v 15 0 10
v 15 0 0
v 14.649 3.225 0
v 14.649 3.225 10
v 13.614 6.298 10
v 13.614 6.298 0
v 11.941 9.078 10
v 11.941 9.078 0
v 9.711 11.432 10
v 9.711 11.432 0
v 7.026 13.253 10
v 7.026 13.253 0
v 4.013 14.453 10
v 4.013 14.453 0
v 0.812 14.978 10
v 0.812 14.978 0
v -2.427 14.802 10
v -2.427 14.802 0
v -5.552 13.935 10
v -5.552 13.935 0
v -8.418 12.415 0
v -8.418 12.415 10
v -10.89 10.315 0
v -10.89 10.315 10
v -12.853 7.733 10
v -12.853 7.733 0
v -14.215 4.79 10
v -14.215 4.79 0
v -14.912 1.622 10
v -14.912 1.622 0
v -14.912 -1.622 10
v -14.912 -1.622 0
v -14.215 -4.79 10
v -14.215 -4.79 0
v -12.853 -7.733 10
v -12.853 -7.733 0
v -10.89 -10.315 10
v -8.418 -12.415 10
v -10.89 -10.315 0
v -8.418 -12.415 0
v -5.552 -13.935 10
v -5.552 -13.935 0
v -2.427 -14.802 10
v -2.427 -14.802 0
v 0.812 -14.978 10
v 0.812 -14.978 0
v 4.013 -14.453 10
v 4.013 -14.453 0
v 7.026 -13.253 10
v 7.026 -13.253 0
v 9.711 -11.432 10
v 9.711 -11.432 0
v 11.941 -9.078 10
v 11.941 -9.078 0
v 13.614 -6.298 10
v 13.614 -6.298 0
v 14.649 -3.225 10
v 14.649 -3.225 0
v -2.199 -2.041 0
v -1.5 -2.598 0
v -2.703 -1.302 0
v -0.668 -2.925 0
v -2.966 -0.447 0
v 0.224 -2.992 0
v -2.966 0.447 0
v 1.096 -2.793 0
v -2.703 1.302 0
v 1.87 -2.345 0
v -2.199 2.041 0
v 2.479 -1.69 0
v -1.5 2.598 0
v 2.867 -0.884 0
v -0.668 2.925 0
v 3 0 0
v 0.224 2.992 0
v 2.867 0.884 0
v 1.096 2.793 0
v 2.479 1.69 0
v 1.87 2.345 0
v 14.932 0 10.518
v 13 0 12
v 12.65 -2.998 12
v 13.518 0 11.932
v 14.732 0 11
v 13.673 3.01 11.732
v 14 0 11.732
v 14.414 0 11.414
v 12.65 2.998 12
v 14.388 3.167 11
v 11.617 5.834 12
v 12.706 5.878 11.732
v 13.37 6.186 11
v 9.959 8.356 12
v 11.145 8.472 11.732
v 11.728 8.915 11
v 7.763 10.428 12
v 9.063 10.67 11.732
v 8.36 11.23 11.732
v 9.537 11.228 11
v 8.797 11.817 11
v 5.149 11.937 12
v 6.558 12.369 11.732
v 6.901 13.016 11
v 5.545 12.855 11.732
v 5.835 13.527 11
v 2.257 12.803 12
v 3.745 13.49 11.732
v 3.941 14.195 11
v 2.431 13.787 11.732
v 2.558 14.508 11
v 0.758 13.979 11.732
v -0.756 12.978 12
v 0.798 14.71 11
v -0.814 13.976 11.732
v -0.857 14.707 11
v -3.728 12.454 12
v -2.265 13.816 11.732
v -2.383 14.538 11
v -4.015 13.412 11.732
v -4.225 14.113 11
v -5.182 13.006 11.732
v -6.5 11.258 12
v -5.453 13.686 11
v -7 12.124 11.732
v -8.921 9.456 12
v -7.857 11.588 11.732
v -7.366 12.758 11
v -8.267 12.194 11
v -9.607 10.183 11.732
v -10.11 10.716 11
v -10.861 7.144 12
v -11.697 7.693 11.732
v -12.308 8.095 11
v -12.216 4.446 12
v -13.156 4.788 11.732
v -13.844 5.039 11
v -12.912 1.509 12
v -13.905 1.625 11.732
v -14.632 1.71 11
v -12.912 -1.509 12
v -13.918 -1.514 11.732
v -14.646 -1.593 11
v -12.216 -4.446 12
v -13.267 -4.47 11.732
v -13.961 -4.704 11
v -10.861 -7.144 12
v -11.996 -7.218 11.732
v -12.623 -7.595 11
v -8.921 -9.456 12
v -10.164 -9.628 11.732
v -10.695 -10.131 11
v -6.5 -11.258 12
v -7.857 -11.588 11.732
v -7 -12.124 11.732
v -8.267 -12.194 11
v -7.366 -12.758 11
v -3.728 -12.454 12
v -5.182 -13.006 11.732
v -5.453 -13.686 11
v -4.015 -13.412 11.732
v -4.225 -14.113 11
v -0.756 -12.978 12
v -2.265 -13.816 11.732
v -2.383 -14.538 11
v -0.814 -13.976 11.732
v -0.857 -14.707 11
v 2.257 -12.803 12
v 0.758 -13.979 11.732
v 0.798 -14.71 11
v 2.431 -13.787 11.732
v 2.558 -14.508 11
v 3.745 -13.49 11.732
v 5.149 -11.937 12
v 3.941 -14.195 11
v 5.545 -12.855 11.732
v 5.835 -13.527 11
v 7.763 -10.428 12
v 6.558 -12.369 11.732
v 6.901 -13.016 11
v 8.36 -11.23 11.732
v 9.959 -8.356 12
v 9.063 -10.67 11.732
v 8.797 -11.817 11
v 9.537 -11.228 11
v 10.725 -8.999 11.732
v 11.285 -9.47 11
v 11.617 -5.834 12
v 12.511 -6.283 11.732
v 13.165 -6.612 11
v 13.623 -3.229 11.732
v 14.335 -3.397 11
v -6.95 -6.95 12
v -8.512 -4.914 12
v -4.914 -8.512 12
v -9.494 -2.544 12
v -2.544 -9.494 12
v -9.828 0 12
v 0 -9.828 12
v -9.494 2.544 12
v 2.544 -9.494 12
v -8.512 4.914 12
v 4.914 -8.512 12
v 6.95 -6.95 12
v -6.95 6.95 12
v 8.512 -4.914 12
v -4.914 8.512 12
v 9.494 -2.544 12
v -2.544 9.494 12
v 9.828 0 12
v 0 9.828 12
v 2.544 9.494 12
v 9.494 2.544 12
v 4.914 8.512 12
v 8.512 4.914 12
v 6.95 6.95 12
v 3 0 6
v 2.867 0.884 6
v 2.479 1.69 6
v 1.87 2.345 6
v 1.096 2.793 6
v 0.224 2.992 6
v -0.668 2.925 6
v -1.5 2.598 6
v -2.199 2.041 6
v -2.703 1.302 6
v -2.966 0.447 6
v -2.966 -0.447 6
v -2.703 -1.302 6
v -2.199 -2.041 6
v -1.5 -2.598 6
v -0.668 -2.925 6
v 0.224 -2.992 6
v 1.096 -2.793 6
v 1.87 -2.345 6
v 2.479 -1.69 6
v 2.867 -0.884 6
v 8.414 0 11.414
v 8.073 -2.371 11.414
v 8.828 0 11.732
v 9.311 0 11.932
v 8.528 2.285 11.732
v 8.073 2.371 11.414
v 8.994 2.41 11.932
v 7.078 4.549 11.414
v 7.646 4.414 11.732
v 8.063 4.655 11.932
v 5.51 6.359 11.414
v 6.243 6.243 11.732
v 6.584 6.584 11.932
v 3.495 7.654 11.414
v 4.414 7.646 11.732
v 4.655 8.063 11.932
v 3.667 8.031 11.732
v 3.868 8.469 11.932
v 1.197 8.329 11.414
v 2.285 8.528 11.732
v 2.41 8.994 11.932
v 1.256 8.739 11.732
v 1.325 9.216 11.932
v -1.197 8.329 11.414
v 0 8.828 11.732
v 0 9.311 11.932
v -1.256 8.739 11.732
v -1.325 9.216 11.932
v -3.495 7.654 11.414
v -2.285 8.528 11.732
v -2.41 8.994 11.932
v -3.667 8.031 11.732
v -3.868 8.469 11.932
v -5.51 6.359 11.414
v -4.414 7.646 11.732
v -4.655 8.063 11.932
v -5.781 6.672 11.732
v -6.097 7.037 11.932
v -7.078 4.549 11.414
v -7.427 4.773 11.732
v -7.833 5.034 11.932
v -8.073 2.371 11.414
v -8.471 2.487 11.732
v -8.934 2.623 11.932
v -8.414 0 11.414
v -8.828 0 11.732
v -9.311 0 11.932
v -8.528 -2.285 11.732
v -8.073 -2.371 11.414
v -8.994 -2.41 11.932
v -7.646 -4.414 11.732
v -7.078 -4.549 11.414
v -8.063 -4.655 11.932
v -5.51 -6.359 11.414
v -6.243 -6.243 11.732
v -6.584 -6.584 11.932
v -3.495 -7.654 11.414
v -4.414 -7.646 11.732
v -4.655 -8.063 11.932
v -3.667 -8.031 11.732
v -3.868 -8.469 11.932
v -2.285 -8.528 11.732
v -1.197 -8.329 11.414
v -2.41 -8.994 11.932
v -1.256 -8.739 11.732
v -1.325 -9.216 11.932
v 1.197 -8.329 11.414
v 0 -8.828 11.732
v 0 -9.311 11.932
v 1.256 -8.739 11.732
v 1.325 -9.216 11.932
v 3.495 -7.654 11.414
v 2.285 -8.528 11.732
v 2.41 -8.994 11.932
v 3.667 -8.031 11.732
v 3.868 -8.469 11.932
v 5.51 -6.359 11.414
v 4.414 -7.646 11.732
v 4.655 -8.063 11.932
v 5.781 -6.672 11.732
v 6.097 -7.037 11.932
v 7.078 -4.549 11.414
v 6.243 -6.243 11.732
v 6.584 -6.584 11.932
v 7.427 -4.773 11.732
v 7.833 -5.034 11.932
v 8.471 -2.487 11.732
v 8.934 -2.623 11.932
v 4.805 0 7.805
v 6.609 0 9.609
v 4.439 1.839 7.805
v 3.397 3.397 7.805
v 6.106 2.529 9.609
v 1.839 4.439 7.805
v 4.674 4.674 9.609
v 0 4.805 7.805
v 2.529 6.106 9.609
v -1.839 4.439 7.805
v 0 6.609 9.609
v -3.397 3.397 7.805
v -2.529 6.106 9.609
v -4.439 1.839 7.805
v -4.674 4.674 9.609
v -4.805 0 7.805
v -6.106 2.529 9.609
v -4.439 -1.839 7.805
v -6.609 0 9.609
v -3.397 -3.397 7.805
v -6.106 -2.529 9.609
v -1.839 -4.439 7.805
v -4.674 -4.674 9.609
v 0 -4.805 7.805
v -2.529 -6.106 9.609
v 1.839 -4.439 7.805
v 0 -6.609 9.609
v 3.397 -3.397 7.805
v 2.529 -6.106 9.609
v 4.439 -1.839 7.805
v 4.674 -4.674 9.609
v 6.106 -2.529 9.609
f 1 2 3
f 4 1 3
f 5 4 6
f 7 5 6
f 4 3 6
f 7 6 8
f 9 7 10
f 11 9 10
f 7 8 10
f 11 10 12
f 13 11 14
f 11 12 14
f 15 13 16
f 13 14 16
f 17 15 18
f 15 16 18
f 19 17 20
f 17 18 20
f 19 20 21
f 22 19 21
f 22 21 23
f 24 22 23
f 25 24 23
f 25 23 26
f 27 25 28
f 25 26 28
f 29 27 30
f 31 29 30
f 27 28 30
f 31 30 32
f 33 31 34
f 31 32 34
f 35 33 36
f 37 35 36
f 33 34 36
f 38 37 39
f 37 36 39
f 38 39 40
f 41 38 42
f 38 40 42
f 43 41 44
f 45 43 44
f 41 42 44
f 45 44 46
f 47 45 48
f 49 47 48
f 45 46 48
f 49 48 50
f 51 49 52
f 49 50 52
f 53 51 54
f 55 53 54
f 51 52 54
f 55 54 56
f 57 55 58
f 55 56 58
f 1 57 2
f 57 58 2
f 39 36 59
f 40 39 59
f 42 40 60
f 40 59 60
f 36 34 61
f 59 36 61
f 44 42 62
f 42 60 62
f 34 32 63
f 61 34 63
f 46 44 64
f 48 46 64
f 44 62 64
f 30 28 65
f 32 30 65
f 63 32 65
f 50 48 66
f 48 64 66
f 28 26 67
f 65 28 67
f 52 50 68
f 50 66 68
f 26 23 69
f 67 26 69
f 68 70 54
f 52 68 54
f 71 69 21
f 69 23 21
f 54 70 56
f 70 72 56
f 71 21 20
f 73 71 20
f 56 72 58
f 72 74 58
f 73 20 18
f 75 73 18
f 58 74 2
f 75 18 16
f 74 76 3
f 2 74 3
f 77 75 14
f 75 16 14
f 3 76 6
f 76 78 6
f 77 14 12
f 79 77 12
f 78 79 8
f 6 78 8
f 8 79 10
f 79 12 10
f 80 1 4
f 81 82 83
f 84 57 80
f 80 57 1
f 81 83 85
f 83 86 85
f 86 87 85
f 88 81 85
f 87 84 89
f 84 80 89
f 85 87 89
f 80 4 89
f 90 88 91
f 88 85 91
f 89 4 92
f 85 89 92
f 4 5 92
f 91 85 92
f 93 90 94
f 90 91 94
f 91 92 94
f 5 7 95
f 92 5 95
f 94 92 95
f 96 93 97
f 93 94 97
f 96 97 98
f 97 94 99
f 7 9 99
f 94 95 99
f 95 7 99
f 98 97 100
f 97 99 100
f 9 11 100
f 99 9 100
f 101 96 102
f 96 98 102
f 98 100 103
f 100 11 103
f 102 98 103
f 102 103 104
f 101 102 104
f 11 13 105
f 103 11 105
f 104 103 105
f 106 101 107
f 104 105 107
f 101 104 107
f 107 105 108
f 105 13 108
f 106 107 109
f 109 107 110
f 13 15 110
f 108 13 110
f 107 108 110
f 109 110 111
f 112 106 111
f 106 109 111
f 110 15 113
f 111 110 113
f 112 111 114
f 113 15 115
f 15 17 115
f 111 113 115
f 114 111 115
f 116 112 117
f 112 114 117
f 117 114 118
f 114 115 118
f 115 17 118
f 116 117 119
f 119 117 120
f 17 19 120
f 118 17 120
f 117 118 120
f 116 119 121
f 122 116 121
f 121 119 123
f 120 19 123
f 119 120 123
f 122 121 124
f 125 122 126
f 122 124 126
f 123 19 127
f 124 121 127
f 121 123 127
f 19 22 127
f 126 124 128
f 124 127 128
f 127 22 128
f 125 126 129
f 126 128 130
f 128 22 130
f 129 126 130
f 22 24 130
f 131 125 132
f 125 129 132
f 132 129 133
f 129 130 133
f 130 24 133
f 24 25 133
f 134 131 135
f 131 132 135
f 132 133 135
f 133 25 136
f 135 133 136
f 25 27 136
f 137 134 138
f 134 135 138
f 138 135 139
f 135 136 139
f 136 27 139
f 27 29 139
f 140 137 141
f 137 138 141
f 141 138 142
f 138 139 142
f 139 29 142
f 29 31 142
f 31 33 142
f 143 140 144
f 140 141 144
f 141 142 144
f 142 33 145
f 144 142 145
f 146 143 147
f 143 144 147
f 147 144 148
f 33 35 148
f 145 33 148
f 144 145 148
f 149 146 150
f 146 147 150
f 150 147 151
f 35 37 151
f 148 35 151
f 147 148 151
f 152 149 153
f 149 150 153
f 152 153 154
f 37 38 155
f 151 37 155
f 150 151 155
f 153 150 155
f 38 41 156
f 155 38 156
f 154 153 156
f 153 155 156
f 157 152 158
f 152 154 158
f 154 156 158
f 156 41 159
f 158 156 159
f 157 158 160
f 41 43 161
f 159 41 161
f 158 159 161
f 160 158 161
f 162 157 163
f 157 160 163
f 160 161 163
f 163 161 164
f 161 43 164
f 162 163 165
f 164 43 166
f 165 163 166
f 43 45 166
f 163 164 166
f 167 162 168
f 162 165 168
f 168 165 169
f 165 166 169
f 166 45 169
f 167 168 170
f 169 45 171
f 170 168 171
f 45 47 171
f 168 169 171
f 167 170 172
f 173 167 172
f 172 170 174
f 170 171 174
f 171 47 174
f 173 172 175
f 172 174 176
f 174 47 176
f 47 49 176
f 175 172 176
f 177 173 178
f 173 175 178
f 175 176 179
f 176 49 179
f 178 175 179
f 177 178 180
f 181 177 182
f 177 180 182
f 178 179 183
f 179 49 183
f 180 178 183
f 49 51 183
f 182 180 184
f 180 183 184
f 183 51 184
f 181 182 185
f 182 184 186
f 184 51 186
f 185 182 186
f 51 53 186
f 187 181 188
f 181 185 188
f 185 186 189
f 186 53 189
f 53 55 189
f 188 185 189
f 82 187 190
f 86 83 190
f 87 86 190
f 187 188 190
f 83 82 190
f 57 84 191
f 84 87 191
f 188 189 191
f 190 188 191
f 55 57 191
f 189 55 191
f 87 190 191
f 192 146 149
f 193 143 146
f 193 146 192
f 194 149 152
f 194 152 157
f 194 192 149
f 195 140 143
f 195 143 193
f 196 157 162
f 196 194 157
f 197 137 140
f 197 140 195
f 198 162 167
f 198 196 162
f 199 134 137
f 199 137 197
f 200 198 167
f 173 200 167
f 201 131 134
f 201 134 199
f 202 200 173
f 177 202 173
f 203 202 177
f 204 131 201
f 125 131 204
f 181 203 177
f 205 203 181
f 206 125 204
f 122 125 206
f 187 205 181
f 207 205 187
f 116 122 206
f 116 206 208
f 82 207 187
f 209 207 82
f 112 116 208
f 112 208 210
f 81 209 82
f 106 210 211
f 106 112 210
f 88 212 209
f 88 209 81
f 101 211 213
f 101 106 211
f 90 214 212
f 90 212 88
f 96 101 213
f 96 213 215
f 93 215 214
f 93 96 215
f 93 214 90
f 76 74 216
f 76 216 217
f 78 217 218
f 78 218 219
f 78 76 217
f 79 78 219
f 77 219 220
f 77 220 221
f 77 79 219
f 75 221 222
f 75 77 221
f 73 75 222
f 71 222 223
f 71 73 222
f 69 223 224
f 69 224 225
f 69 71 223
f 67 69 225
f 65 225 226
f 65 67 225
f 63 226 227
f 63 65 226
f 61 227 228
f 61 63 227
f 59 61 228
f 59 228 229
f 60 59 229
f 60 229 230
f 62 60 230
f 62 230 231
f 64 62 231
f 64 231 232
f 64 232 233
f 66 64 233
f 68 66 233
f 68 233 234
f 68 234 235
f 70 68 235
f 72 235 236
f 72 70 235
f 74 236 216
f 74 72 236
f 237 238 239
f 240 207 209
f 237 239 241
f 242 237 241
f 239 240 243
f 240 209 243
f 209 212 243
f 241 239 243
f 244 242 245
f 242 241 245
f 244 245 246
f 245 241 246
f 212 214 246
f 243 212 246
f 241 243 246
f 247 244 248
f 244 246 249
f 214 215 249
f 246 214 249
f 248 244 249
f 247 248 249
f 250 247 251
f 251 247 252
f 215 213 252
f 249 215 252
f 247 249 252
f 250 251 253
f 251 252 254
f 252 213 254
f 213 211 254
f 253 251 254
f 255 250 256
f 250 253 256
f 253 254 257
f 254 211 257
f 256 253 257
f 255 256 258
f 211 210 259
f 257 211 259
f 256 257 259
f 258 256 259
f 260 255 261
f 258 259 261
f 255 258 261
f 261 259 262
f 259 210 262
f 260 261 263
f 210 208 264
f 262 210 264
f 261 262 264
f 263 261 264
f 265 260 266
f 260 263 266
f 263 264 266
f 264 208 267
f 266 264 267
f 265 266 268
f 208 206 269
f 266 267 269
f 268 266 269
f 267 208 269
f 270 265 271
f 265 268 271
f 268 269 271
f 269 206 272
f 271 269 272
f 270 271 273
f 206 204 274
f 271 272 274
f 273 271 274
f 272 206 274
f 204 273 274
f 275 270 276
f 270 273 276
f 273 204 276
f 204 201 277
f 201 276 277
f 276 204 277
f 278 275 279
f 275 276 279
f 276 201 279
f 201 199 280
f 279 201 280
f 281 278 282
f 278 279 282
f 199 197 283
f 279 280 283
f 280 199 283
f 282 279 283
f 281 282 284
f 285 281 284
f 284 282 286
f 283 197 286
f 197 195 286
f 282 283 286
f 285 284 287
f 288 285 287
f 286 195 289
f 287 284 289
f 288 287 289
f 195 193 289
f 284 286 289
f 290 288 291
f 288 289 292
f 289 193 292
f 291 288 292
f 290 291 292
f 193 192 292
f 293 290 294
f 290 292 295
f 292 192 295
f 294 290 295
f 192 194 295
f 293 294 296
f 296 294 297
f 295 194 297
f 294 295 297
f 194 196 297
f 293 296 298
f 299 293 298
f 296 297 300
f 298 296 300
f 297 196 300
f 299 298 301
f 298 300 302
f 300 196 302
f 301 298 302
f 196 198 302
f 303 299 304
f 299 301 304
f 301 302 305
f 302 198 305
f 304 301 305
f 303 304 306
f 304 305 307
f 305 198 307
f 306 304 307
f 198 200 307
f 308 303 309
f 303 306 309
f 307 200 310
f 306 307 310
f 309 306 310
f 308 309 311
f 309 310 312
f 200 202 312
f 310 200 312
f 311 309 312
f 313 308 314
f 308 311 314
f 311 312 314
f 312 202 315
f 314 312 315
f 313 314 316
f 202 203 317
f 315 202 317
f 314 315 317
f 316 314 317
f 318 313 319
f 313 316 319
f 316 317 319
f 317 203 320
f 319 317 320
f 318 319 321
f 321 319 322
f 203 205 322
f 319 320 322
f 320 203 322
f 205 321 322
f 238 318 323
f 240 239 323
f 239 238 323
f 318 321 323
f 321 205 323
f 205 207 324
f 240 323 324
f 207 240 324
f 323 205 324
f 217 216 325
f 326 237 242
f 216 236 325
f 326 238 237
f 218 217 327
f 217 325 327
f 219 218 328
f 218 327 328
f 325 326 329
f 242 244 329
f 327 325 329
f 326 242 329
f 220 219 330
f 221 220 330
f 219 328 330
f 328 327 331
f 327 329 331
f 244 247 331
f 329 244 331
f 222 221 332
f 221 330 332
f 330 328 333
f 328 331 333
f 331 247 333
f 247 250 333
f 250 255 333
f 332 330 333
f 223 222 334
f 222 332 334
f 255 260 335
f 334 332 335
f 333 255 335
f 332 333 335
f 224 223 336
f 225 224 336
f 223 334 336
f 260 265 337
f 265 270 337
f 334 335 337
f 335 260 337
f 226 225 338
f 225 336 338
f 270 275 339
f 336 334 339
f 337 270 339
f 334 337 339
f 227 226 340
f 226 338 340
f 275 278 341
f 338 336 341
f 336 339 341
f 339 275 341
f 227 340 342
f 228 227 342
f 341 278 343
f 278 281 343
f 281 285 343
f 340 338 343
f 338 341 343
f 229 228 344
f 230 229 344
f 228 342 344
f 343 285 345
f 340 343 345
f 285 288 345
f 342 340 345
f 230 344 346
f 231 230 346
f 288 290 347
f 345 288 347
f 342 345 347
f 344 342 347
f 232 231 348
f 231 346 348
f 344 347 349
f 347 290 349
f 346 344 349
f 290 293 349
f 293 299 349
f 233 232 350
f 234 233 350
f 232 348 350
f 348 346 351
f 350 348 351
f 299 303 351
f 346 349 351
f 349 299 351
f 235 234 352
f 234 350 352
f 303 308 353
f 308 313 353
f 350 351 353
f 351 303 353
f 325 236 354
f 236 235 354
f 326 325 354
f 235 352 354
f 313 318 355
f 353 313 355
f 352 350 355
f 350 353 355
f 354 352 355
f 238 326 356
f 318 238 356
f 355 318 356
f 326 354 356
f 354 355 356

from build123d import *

# Parameters (mm, degrees)
ESQUISSE1_R        = 15
ESQUISSE1_R_2      = 3
BOSS_EXTRU_1_DEPTH = 12
CHANFREIN1_SIZE    = 6
CONG_1_R           = 2


with BuildPart() as part:
    # Esquisse1 → Boss.-Extru.1 (new body)
    with BuildSketch(Plane.XY):
        Circle(ESQUISSE1_R)
        Circle(ESQUISSE1_R_2, mode=Mode.SUBTRACT)
    extrude(amount=BOSS_EXTRU_1_DEPTH)

    # Chanfrein1
    chanfrein1_edges = [part.edges().sort_by_distance(p)[0] for p in [
        (-3, 0, 12),
    ]]
    chamfer(chanfrein1_edges, length=CHANFREIN1_SIZE)

    # Congé1
    cong_1_edges = [part.edges().sort_by_distance(p)[0] for p in [
        (-9, 0, 12),
        (-15, 0, 12),
    ]]
    fillet(cong_1_edges, radius=CONG_1_R)


solid = part.part
